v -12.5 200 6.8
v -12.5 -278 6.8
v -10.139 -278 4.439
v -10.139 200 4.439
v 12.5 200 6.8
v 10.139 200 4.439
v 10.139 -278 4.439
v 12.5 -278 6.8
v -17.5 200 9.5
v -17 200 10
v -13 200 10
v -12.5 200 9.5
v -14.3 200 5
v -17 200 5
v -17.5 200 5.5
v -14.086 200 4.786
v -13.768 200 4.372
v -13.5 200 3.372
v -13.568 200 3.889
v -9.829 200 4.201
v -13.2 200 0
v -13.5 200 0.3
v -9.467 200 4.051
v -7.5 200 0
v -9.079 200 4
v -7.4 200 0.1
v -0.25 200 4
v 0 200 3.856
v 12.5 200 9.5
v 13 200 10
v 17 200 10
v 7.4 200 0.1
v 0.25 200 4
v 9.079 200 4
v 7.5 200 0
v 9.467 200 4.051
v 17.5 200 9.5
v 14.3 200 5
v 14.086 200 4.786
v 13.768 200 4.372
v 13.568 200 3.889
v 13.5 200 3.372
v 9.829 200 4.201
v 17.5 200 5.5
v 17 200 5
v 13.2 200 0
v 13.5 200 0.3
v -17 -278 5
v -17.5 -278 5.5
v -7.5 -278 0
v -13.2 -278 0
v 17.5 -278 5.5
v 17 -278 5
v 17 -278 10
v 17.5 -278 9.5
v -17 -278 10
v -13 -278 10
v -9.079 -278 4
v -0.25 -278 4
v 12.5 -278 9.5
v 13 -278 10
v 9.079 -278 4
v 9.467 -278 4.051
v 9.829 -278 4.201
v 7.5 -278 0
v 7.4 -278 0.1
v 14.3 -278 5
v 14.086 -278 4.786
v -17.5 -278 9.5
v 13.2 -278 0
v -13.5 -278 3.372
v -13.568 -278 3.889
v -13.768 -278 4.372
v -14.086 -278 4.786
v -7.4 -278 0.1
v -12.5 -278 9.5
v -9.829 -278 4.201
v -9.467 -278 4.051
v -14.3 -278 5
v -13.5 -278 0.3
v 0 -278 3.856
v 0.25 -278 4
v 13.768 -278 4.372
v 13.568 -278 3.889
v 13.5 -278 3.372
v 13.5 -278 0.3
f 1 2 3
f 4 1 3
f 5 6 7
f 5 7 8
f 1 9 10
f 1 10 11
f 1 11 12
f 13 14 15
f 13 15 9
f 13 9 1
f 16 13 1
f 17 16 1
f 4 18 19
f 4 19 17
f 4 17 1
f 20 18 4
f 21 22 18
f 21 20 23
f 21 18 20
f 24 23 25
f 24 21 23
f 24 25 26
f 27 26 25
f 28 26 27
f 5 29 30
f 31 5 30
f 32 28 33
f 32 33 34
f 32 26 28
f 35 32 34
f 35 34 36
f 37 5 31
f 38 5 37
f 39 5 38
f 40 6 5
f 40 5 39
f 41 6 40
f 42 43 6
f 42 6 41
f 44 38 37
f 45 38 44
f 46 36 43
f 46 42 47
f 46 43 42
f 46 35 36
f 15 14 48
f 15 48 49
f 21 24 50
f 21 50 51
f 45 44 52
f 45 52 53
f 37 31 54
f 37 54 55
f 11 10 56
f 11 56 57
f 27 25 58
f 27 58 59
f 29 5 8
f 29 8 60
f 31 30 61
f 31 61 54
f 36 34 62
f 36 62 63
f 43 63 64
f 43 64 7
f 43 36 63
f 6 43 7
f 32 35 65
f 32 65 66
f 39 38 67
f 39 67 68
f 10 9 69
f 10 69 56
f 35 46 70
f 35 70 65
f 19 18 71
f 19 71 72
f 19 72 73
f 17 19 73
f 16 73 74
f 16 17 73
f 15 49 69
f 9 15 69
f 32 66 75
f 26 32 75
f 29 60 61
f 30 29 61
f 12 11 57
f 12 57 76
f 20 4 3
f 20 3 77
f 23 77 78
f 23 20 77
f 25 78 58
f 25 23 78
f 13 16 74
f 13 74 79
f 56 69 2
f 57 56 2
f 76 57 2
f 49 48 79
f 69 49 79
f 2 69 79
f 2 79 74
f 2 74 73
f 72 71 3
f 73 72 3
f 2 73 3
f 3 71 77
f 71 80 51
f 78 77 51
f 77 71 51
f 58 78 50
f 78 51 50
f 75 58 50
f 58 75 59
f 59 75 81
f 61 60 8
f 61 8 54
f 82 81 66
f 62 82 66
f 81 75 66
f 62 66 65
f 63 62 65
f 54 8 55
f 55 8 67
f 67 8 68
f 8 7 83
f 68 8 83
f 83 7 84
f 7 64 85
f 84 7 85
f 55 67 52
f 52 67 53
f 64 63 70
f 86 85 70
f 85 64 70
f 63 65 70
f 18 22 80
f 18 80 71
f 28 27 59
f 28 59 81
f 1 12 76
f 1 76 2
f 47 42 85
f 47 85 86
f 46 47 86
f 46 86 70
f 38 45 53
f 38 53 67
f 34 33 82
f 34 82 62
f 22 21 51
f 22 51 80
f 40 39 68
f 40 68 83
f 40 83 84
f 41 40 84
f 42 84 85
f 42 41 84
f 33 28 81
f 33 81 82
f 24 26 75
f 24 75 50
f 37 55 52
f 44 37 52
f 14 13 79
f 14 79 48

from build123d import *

# Parameters (mm, degrees)
BOSS_EXTRUDE1_DEPTH = 478


with BuildPart() as part:
    # Sketch1 → Boss-Extrude1 (new body)
    with BuildSketch(Plane(origin=(0, 200, 0), x_dir=(1, 0, 0), z_dir=(0, 1, 0))):
        with BuildLine():
            Line((1e-09, -3.855700002), (0.25, -4.00003757))
            Line((0.25, -4.00003757), (9.078700232, -4.00003757))
            ThreePointArc((9.078700232, -4.00003757), (9.652725366, -4.114218268), (10.139360377, -4.439377387))
            Line((10.139360377, -4.439377387), (12.500020747, -6.800037757))
            Line((12.500020747, -6.800037757), (12.500020747, -9.500037757))
            Line((12.500020747, -9.500037757), (13.00002072, -10.000037755))
            Line((13.00002072, -10.000037755), (17.00002072, -10.000037755))
            Line((17.00002072, -10.000037755), (17.500020747, -9.500037752))
            Line((17.500020747, -9.500037752), (17.500020747, -5.500037752))
            Line((17.500020747, -5.500037752), (17.00002075, -5.0000377))
            Line((17.00002075, -5.0000377), (14.30002072, -5.0000377))
            Line((14.30002072, -5.0000377), (14.085807141, -4.785824121))
            ThreePointArc((14.085807141, -4.785824121), (13.652261651, -4.136977442), (13.50002072, -3.371610598))
            Line((13.50002072, -3.371610598), (13.50002072, -0.30003757))
            Line((13.50002072, -0.30003757), (13.20002072, -3.757e-05))
            Line((13.20002072, -3.757e-05), (7.50002072, -3.757e-05))
            Line((7.50002072, -3.757e-05), (7.40002072, -0.10003757))
            Line((7.40002072, -0.10003757), (-7.40002072, -0.10003757))
            Line((-7.40002072, -0.10003757), (-7.50002072, -3.757e-05))
            Line((-7.50002072, -3.757e-05), (-13.20002072, -3.757e-05))
            Line((-13.20002072, -3.757e-05), (-13.50002072, -0.30003757))
            Line((-13.50002072, -0.30003757), (-13.50002072, -3.371610628))
            ThreePointArc((-13.50002072, -3.371610628), (-13.652261651, -4.136977472), (-14.085807141, -4.785824151))
            Line((-14.085807141, -4.785824151), (-14.30002069, -5.0000377))
            Line((-14.30002069, -5.0000377), (-17.00002072, -5.0000377))
            Line((-17.00002072, -5.0000377), (-17.50002072, -5.50003767))
            Line((-17.50002072, -5.50003767), (-17.50002072, -9.50003767))
            Line((-17.50002072, -9.50003767), (-17.000020665, -10.000037755))
            Line((-17.000020665, -10.000037755), (-13.00002072, -10.000037755))
            Line((-13.00002072, -10.000037755), (-12.500020741, -9.500037764))
            Line((-12.500020741, -9.500037764), (-12.500020741, -6.800037764))
            Line((-12.500020741, -6.800037764), (-10.139360364, -4.439377387))
            ThreePointArc((-10.139360364, -4.439377387), (-9.652725352, -4.114218268), (-9.078700218, -4.00003757))
            Line((-9.078700218, -4.00003757), (-0.25, -4.00003757))
            Line((-0.25, -4.00003757), (1e-09, -3.855700002))
        make_face()
    extrude(amount=-BOSS_EXTRUDE1_DEPTH)


solid = part.part
